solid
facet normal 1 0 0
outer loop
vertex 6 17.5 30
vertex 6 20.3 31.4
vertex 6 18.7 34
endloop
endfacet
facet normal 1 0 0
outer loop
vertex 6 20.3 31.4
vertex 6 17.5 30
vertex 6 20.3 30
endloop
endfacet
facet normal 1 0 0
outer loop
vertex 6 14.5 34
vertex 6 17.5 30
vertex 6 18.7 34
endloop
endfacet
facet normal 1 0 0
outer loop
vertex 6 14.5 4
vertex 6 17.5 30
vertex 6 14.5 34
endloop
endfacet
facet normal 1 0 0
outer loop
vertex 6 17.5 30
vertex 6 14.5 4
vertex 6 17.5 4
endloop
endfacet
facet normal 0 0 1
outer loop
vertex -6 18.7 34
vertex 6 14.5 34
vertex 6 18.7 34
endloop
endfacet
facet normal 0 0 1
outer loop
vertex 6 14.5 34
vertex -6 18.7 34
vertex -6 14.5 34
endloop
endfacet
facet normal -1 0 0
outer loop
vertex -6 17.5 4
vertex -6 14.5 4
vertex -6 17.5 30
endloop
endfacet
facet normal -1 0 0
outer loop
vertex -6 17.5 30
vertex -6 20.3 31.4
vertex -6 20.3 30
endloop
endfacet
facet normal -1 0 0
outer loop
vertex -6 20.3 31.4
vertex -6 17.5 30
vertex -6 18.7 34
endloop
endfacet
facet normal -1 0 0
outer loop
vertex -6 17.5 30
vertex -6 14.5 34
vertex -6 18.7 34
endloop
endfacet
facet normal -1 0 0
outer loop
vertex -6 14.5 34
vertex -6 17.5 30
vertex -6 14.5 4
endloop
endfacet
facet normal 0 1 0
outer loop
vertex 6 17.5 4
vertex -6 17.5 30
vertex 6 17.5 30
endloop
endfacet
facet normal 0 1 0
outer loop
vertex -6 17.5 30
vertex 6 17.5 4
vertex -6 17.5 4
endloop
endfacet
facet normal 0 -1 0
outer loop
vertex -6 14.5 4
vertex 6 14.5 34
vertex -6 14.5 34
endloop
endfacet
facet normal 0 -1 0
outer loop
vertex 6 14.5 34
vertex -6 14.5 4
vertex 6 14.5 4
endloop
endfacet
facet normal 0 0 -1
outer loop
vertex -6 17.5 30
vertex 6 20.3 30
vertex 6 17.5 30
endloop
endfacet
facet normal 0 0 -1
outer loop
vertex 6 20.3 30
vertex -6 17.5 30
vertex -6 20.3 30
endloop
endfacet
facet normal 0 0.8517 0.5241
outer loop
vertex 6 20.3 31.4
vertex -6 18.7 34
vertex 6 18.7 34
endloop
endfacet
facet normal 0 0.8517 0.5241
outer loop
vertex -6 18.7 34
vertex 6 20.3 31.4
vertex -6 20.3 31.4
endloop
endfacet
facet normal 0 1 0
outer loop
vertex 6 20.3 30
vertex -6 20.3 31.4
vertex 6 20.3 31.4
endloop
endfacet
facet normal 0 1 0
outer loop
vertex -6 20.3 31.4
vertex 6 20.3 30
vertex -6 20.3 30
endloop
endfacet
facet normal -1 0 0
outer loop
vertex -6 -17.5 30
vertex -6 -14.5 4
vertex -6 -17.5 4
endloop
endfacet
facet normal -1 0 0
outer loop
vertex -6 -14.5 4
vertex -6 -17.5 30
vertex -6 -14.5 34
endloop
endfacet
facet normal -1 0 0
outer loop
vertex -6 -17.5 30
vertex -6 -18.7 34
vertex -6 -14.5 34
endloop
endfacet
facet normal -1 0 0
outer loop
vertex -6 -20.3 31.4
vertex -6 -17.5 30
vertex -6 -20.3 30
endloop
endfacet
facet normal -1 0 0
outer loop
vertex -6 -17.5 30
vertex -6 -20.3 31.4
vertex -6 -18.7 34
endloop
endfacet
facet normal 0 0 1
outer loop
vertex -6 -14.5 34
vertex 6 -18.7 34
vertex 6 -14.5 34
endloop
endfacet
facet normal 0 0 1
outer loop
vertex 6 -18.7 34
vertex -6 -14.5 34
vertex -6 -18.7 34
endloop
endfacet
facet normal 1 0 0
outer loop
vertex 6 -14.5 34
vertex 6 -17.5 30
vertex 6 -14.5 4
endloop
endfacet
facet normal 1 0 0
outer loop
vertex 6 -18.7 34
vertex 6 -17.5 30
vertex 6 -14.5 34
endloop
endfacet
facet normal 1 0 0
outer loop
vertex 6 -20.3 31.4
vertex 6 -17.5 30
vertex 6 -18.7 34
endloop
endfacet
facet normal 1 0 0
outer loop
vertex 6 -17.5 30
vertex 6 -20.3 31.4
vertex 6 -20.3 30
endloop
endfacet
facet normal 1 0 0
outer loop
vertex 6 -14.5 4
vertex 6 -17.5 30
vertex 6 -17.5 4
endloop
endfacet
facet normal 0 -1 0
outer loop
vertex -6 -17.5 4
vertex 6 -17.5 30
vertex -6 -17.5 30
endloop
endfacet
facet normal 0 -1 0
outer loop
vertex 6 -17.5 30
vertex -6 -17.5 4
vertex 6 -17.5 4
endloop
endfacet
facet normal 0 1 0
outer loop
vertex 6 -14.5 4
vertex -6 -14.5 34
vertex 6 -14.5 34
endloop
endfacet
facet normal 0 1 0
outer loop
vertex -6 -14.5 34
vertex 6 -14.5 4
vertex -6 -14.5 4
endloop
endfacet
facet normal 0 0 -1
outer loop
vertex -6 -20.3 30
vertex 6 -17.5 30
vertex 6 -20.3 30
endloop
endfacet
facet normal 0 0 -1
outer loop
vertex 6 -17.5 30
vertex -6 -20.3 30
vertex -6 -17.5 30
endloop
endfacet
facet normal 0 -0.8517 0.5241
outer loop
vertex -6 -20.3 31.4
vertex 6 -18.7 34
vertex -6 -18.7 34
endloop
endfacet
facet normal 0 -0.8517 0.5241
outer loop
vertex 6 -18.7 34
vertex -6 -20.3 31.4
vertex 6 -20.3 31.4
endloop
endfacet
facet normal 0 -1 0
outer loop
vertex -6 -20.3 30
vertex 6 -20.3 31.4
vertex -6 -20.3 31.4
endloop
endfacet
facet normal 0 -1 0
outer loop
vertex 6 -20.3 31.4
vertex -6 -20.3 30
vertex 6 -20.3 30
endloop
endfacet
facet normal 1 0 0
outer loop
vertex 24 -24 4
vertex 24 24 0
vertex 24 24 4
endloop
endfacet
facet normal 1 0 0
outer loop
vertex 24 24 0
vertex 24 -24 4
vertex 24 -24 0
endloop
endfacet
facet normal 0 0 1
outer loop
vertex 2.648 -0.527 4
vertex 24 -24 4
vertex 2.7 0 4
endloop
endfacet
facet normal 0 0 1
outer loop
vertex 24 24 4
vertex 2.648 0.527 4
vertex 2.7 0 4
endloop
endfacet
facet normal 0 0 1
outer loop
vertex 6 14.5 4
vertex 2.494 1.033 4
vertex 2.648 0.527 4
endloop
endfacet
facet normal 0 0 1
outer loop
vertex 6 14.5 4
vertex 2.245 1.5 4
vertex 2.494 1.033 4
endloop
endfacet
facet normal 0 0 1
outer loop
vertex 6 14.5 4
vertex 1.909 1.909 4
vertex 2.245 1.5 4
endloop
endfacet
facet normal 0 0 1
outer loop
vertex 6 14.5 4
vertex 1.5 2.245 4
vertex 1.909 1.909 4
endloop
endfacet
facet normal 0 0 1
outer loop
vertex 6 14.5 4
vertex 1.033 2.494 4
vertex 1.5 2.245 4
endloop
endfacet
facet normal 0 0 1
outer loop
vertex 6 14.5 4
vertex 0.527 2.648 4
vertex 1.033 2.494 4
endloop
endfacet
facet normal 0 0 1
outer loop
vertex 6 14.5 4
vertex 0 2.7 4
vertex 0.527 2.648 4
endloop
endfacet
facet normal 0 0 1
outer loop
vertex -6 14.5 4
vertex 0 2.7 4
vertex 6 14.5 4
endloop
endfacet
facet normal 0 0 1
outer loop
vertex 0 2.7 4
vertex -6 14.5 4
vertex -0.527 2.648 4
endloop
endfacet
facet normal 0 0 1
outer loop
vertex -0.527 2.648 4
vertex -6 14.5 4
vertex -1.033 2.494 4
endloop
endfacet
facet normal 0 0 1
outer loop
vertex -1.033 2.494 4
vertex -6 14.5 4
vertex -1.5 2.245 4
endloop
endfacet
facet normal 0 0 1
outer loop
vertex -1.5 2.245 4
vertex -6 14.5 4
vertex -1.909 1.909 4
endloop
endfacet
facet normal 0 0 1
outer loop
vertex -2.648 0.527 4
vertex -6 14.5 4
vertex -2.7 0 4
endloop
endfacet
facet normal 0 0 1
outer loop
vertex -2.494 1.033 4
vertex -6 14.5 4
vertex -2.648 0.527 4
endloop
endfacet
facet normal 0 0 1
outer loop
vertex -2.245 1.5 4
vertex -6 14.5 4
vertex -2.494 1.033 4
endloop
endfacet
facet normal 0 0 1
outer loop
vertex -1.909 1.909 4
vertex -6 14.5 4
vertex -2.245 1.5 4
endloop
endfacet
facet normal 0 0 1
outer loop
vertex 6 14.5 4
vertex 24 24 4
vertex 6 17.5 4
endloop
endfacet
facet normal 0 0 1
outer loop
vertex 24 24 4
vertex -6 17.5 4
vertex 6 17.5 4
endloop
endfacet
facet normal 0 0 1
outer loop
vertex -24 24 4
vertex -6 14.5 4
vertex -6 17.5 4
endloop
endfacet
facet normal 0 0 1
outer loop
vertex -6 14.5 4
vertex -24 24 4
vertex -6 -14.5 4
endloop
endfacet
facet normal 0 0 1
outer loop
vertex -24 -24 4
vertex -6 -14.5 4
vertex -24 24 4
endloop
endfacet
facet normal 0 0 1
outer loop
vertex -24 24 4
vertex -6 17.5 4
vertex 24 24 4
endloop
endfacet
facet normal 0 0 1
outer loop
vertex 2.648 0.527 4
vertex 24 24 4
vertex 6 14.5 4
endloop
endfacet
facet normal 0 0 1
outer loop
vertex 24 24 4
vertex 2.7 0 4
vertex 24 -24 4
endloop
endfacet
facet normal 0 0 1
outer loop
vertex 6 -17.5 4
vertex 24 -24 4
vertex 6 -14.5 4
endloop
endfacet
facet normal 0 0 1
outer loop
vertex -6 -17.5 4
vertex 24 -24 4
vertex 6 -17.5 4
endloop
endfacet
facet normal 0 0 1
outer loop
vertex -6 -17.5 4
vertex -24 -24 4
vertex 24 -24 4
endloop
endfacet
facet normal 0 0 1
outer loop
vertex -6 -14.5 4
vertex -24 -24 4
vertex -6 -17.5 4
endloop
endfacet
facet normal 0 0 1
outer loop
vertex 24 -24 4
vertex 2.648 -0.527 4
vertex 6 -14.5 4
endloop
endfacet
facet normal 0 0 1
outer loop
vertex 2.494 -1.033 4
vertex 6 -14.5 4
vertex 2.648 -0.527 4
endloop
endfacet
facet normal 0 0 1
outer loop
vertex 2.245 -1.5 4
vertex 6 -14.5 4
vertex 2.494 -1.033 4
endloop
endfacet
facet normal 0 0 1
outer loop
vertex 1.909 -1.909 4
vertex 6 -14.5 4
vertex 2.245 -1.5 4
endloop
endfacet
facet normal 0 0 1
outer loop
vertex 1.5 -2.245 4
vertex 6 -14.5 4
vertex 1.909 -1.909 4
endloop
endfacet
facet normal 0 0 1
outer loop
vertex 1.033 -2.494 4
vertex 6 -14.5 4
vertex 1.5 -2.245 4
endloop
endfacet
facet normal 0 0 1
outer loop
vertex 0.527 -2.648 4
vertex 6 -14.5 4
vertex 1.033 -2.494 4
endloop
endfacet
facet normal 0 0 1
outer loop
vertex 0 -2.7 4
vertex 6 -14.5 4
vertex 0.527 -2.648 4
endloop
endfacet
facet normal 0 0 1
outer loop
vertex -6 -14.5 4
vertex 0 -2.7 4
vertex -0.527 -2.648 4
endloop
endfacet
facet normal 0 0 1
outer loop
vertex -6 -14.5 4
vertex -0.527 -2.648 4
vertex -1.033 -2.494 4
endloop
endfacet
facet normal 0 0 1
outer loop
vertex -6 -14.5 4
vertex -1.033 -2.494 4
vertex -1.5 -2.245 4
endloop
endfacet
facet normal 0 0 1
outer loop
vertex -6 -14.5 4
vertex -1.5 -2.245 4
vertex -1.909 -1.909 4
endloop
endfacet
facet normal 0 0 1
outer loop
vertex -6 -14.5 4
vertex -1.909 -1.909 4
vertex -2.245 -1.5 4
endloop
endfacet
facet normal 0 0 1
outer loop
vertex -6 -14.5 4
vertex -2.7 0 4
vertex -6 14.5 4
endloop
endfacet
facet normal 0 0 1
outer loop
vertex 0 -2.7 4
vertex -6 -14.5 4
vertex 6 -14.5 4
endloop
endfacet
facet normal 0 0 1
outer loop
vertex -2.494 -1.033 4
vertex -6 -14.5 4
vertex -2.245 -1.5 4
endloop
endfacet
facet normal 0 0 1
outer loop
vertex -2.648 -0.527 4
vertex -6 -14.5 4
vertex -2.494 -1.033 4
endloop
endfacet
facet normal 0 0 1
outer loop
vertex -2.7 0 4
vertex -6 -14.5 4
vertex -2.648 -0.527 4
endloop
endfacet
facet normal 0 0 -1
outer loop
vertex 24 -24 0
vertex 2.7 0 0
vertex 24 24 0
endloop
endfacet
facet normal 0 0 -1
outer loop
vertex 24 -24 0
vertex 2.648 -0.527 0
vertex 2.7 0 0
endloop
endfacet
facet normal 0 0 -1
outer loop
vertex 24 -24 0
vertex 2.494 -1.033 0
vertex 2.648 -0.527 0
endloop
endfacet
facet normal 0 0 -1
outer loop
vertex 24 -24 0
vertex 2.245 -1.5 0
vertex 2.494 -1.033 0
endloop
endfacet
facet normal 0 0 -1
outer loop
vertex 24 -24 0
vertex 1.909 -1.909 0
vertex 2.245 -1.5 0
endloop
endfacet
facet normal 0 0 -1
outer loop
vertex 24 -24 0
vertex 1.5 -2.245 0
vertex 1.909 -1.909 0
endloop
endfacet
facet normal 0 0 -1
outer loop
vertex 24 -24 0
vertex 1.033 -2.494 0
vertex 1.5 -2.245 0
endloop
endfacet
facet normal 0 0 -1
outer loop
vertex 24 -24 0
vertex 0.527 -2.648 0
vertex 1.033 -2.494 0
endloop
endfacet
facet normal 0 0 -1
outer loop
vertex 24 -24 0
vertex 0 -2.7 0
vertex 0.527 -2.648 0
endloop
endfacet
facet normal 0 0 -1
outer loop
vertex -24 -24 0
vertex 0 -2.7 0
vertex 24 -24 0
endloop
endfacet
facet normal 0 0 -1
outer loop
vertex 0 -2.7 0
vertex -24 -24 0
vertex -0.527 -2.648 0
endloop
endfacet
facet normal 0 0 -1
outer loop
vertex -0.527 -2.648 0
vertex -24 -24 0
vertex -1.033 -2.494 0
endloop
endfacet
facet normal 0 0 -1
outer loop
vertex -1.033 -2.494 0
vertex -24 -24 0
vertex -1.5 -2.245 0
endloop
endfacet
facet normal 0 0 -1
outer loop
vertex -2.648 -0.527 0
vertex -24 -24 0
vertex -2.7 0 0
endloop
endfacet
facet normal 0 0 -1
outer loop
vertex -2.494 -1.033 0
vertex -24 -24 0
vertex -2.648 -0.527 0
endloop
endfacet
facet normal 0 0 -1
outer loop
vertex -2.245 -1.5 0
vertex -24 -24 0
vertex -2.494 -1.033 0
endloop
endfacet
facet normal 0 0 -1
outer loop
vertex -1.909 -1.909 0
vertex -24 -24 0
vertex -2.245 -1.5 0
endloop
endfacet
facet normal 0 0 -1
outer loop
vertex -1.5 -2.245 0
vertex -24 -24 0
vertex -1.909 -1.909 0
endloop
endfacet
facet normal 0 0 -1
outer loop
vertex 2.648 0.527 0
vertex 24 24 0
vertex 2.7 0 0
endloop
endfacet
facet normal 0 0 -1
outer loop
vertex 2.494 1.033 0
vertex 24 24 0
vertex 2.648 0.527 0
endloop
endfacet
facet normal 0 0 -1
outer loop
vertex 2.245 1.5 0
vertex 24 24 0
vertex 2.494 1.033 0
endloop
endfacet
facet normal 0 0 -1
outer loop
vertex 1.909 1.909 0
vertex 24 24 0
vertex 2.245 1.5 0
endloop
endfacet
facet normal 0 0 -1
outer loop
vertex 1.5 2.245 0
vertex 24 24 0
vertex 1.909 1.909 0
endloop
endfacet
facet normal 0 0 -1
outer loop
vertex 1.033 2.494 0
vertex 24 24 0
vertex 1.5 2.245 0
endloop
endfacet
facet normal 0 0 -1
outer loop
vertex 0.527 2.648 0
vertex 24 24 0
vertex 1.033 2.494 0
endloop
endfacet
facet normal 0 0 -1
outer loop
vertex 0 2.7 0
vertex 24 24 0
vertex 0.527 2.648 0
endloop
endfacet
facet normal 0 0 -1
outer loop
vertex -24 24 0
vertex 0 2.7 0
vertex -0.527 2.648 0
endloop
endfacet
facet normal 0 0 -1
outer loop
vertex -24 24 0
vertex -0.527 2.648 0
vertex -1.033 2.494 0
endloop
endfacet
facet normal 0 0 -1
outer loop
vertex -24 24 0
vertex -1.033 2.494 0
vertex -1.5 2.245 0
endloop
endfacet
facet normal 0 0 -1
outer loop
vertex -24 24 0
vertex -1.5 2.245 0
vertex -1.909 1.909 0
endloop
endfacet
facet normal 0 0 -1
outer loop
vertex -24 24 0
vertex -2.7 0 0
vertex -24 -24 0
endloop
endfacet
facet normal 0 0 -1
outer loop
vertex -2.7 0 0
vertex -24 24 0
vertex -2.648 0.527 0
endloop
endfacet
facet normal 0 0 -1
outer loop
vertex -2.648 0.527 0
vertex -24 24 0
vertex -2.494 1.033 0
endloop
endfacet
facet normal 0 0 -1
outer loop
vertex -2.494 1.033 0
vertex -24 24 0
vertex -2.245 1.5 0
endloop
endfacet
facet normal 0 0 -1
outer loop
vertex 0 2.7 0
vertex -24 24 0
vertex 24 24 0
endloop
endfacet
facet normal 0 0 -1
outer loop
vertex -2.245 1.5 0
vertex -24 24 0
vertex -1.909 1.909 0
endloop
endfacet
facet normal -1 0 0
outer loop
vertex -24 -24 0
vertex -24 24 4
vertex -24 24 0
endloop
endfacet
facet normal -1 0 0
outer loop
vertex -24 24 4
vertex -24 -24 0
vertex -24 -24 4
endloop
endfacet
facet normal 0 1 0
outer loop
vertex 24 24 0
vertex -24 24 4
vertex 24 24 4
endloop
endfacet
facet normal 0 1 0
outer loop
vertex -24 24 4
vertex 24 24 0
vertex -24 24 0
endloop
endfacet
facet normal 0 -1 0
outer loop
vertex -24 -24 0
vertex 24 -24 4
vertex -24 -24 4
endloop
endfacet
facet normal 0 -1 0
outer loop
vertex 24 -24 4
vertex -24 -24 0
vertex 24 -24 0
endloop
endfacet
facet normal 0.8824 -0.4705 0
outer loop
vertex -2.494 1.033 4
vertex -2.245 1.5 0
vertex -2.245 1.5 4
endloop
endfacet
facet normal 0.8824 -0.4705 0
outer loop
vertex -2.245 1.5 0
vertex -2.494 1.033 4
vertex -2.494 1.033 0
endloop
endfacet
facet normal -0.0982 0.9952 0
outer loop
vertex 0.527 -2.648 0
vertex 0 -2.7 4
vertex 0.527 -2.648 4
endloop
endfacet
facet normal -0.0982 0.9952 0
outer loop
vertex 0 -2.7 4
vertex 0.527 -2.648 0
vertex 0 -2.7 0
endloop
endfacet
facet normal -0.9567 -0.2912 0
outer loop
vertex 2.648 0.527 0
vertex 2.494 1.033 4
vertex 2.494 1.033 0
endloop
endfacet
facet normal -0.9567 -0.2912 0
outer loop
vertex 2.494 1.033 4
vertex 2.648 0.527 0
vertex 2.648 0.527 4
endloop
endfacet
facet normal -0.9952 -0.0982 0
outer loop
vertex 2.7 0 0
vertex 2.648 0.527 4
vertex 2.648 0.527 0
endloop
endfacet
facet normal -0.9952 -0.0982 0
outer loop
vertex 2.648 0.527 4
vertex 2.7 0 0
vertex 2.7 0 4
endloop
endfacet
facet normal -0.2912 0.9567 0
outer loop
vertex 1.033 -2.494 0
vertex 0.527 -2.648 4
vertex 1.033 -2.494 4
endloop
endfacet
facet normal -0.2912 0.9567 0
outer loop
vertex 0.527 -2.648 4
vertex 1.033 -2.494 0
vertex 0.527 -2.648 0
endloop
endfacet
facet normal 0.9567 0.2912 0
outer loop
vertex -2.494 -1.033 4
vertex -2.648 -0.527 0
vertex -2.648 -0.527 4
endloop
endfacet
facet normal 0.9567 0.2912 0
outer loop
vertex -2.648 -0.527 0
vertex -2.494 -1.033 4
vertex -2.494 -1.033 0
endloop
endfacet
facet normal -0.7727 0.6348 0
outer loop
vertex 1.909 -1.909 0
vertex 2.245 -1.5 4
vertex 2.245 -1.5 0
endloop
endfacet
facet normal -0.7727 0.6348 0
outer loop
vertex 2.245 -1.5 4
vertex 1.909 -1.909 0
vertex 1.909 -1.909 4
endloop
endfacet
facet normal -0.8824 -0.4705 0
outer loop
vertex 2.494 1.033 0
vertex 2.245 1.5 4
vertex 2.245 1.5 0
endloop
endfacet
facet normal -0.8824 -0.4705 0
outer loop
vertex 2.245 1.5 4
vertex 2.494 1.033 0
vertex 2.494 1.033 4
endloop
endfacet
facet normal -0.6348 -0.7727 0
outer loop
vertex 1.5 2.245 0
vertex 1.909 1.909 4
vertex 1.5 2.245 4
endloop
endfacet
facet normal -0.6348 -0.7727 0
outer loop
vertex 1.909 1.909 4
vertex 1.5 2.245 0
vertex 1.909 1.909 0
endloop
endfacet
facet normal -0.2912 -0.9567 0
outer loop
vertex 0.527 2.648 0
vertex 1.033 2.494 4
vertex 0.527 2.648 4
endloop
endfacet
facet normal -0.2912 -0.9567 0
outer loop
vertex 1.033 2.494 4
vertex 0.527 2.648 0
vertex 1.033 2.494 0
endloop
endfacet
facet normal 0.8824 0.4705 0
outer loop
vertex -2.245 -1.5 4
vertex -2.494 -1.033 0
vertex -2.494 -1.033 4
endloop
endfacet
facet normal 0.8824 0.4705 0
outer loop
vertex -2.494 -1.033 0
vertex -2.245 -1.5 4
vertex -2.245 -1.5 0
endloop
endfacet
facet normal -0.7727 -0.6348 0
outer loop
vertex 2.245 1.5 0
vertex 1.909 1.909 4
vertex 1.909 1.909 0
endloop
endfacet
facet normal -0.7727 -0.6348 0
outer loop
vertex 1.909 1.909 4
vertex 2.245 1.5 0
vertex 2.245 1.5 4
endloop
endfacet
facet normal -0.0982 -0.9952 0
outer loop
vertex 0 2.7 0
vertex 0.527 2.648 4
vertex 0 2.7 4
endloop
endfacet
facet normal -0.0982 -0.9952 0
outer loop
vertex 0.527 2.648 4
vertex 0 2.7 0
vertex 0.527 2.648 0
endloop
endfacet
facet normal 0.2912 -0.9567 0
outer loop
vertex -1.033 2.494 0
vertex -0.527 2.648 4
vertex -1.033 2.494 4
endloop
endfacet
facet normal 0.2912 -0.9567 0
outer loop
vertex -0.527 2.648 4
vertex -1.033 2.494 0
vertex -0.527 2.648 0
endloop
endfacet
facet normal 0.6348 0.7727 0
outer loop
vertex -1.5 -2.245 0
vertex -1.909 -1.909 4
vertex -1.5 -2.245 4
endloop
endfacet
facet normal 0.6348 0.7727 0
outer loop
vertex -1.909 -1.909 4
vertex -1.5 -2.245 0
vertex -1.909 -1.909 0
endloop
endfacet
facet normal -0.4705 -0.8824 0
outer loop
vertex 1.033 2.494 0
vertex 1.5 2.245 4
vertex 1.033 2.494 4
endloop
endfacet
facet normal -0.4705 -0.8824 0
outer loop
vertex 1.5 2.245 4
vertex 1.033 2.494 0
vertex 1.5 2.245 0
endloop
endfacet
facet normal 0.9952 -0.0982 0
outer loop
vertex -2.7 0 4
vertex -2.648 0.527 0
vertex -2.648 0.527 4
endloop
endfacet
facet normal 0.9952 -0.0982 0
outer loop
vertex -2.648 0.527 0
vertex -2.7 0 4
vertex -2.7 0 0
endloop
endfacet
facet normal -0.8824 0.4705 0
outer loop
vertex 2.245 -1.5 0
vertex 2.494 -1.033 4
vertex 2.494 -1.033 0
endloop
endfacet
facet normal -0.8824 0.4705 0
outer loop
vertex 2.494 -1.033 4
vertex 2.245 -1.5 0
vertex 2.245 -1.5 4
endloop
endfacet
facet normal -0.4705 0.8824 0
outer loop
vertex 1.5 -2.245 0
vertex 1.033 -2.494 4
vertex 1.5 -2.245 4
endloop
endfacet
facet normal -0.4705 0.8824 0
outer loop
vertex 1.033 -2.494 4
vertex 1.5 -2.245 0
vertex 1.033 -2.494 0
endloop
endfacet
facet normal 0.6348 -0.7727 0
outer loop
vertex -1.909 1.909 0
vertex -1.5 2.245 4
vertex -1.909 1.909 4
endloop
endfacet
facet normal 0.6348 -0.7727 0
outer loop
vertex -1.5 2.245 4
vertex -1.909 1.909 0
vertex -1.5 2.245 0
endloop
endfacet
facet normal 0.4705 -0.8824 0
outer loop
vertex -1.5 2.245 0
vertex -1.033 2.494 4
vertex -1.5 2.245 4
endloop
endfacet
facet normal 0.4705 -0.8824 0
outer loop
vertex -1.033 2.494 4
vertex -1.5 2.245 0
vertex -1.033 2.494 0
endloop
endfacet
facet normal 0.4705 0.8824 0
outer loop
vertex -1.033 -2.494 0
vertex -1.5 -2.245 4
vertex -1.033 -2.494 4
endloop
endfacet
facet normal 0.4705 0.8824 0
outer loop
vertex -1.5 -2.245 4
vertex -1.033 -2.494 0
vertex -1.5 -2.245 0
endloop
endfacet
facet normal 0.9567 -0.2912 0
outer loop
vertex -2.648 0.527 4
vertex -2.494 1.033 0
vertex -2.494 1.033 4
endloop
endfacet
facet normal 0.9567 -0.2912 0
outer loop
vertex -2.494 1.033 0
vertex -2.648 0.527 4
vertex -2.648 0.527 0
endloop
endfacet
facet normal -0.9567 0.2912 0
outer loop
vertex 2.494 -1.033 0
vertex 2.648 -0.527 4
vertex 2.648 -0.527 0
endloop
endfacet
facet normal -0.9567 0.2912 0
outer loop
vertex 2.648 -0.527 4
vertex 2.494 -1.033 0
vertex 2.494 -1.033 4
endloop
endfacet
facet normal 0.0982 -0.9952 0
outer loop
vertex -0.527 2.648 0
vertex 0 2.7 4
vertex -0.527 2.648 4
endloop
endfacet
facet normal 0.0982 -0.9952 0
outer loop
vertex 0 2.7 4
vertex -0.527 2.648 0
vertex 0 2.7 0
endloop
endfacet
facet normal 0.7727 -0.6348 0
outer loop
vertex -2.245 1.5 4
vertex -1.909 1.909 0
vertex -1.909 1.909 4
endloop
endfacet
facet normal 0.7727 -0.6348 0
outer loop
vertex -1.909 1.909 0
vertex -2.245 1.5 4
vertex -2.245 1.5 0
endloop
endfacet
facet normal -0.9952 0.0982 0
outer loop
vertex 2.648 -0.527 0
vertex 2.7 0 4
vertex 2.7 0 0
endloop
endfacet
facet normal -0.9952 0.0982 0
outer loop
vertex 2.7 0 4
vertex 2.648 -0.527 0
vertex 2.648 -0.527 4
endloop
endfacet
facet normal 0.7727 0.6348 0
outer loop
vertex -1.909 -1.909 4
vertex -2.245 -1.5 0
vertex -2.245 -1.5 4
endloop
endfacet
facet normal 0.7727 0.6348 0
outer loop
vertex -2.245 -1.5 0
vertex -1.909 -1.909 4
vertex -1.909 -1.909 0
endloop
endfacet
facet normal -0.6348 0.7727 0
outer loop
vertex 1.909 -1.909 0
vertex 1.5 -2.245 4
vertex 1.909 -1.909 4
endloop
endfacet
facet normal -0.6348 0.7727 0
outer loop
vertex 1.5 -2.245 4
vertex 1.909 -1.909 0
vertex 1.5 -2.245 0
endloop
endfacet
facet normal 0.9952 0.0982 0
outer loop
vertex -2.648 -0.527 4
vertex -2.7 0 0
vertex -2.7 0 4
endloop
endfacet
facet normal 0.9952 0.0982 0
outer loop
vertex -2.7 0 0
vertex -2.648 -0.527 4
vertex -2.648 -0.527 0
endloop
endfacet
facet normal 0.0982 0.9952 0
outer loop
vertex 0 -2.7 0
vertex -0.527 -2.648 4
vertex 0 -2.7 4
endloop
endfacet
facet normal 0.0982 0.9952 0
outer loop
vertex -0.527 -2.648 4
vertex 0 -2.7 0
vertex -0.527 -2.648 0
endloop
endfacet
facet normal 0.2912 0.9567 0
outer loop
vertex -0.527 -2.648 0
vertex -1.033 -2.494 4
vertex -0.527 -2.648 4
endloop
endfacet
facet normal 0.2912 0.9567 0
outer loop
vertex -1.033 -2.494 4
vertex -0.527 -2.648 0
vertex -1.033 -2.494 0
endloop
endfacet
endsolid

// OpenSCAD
$fn = 32;

// ----------------------------------------------------------------------
// Snap-fit latch: 2 arms, 30 mm tall, 3 mm undercut hooks
// ----------------------------------------------------------------------

// --- parameters (mm) ---
base_d = 48;              // base plate depth
base_h = 4;               // base plate thickness
span = 32;                // distance between opposite arms
arm_t = 3;                // arm thickness
arm_d = 12;               // arm width
height = 30;              // free arm length
head_len = 3;             // hook reach
head_h = 4;               // hook height
lead = 1.4;               // lead-in ramp thickness
bore_d = 5.4;             // base fixing bore
top_z = 34;               // height of the arm tips above the base

arms = 2;

difference() {
  union() {
    /* base plate, centred on the arm ring */
    translate([-24, -24, 0]) cube([base_d, base_d, base_h]);
    for (a = [0 : 360 / arms : 359]) rotate([0, 0, a]) {
    /* arm, sunk 0.5 mm into the base */
    translate([-arm_d / 2, span / 2 - arm_t / 2, base_h - 0.5]) cube([arm_d, arm_t, height + 0.5]);
    /* hook: a convex hull of a tall inner block and a thin outer lip
       gives a flat undercut below and a lead-in ramp on top */
    hull() {
      translate([-arm_d / 2, span / 2 + arm_t / 2 - 0.6, top_z - head_h]) cube([arm_d, lead + 0.4, head_h]);
      translate([-arm_d / 2, span / 2 + arm_t / 2 - 0.2, top_z - head_h]) cube([arm_d, head_len, lead]);
    }
    }
  }
  translate([0, 0, -2.5]) cylinder(h = base_h + 5, d = bore_d);
}
